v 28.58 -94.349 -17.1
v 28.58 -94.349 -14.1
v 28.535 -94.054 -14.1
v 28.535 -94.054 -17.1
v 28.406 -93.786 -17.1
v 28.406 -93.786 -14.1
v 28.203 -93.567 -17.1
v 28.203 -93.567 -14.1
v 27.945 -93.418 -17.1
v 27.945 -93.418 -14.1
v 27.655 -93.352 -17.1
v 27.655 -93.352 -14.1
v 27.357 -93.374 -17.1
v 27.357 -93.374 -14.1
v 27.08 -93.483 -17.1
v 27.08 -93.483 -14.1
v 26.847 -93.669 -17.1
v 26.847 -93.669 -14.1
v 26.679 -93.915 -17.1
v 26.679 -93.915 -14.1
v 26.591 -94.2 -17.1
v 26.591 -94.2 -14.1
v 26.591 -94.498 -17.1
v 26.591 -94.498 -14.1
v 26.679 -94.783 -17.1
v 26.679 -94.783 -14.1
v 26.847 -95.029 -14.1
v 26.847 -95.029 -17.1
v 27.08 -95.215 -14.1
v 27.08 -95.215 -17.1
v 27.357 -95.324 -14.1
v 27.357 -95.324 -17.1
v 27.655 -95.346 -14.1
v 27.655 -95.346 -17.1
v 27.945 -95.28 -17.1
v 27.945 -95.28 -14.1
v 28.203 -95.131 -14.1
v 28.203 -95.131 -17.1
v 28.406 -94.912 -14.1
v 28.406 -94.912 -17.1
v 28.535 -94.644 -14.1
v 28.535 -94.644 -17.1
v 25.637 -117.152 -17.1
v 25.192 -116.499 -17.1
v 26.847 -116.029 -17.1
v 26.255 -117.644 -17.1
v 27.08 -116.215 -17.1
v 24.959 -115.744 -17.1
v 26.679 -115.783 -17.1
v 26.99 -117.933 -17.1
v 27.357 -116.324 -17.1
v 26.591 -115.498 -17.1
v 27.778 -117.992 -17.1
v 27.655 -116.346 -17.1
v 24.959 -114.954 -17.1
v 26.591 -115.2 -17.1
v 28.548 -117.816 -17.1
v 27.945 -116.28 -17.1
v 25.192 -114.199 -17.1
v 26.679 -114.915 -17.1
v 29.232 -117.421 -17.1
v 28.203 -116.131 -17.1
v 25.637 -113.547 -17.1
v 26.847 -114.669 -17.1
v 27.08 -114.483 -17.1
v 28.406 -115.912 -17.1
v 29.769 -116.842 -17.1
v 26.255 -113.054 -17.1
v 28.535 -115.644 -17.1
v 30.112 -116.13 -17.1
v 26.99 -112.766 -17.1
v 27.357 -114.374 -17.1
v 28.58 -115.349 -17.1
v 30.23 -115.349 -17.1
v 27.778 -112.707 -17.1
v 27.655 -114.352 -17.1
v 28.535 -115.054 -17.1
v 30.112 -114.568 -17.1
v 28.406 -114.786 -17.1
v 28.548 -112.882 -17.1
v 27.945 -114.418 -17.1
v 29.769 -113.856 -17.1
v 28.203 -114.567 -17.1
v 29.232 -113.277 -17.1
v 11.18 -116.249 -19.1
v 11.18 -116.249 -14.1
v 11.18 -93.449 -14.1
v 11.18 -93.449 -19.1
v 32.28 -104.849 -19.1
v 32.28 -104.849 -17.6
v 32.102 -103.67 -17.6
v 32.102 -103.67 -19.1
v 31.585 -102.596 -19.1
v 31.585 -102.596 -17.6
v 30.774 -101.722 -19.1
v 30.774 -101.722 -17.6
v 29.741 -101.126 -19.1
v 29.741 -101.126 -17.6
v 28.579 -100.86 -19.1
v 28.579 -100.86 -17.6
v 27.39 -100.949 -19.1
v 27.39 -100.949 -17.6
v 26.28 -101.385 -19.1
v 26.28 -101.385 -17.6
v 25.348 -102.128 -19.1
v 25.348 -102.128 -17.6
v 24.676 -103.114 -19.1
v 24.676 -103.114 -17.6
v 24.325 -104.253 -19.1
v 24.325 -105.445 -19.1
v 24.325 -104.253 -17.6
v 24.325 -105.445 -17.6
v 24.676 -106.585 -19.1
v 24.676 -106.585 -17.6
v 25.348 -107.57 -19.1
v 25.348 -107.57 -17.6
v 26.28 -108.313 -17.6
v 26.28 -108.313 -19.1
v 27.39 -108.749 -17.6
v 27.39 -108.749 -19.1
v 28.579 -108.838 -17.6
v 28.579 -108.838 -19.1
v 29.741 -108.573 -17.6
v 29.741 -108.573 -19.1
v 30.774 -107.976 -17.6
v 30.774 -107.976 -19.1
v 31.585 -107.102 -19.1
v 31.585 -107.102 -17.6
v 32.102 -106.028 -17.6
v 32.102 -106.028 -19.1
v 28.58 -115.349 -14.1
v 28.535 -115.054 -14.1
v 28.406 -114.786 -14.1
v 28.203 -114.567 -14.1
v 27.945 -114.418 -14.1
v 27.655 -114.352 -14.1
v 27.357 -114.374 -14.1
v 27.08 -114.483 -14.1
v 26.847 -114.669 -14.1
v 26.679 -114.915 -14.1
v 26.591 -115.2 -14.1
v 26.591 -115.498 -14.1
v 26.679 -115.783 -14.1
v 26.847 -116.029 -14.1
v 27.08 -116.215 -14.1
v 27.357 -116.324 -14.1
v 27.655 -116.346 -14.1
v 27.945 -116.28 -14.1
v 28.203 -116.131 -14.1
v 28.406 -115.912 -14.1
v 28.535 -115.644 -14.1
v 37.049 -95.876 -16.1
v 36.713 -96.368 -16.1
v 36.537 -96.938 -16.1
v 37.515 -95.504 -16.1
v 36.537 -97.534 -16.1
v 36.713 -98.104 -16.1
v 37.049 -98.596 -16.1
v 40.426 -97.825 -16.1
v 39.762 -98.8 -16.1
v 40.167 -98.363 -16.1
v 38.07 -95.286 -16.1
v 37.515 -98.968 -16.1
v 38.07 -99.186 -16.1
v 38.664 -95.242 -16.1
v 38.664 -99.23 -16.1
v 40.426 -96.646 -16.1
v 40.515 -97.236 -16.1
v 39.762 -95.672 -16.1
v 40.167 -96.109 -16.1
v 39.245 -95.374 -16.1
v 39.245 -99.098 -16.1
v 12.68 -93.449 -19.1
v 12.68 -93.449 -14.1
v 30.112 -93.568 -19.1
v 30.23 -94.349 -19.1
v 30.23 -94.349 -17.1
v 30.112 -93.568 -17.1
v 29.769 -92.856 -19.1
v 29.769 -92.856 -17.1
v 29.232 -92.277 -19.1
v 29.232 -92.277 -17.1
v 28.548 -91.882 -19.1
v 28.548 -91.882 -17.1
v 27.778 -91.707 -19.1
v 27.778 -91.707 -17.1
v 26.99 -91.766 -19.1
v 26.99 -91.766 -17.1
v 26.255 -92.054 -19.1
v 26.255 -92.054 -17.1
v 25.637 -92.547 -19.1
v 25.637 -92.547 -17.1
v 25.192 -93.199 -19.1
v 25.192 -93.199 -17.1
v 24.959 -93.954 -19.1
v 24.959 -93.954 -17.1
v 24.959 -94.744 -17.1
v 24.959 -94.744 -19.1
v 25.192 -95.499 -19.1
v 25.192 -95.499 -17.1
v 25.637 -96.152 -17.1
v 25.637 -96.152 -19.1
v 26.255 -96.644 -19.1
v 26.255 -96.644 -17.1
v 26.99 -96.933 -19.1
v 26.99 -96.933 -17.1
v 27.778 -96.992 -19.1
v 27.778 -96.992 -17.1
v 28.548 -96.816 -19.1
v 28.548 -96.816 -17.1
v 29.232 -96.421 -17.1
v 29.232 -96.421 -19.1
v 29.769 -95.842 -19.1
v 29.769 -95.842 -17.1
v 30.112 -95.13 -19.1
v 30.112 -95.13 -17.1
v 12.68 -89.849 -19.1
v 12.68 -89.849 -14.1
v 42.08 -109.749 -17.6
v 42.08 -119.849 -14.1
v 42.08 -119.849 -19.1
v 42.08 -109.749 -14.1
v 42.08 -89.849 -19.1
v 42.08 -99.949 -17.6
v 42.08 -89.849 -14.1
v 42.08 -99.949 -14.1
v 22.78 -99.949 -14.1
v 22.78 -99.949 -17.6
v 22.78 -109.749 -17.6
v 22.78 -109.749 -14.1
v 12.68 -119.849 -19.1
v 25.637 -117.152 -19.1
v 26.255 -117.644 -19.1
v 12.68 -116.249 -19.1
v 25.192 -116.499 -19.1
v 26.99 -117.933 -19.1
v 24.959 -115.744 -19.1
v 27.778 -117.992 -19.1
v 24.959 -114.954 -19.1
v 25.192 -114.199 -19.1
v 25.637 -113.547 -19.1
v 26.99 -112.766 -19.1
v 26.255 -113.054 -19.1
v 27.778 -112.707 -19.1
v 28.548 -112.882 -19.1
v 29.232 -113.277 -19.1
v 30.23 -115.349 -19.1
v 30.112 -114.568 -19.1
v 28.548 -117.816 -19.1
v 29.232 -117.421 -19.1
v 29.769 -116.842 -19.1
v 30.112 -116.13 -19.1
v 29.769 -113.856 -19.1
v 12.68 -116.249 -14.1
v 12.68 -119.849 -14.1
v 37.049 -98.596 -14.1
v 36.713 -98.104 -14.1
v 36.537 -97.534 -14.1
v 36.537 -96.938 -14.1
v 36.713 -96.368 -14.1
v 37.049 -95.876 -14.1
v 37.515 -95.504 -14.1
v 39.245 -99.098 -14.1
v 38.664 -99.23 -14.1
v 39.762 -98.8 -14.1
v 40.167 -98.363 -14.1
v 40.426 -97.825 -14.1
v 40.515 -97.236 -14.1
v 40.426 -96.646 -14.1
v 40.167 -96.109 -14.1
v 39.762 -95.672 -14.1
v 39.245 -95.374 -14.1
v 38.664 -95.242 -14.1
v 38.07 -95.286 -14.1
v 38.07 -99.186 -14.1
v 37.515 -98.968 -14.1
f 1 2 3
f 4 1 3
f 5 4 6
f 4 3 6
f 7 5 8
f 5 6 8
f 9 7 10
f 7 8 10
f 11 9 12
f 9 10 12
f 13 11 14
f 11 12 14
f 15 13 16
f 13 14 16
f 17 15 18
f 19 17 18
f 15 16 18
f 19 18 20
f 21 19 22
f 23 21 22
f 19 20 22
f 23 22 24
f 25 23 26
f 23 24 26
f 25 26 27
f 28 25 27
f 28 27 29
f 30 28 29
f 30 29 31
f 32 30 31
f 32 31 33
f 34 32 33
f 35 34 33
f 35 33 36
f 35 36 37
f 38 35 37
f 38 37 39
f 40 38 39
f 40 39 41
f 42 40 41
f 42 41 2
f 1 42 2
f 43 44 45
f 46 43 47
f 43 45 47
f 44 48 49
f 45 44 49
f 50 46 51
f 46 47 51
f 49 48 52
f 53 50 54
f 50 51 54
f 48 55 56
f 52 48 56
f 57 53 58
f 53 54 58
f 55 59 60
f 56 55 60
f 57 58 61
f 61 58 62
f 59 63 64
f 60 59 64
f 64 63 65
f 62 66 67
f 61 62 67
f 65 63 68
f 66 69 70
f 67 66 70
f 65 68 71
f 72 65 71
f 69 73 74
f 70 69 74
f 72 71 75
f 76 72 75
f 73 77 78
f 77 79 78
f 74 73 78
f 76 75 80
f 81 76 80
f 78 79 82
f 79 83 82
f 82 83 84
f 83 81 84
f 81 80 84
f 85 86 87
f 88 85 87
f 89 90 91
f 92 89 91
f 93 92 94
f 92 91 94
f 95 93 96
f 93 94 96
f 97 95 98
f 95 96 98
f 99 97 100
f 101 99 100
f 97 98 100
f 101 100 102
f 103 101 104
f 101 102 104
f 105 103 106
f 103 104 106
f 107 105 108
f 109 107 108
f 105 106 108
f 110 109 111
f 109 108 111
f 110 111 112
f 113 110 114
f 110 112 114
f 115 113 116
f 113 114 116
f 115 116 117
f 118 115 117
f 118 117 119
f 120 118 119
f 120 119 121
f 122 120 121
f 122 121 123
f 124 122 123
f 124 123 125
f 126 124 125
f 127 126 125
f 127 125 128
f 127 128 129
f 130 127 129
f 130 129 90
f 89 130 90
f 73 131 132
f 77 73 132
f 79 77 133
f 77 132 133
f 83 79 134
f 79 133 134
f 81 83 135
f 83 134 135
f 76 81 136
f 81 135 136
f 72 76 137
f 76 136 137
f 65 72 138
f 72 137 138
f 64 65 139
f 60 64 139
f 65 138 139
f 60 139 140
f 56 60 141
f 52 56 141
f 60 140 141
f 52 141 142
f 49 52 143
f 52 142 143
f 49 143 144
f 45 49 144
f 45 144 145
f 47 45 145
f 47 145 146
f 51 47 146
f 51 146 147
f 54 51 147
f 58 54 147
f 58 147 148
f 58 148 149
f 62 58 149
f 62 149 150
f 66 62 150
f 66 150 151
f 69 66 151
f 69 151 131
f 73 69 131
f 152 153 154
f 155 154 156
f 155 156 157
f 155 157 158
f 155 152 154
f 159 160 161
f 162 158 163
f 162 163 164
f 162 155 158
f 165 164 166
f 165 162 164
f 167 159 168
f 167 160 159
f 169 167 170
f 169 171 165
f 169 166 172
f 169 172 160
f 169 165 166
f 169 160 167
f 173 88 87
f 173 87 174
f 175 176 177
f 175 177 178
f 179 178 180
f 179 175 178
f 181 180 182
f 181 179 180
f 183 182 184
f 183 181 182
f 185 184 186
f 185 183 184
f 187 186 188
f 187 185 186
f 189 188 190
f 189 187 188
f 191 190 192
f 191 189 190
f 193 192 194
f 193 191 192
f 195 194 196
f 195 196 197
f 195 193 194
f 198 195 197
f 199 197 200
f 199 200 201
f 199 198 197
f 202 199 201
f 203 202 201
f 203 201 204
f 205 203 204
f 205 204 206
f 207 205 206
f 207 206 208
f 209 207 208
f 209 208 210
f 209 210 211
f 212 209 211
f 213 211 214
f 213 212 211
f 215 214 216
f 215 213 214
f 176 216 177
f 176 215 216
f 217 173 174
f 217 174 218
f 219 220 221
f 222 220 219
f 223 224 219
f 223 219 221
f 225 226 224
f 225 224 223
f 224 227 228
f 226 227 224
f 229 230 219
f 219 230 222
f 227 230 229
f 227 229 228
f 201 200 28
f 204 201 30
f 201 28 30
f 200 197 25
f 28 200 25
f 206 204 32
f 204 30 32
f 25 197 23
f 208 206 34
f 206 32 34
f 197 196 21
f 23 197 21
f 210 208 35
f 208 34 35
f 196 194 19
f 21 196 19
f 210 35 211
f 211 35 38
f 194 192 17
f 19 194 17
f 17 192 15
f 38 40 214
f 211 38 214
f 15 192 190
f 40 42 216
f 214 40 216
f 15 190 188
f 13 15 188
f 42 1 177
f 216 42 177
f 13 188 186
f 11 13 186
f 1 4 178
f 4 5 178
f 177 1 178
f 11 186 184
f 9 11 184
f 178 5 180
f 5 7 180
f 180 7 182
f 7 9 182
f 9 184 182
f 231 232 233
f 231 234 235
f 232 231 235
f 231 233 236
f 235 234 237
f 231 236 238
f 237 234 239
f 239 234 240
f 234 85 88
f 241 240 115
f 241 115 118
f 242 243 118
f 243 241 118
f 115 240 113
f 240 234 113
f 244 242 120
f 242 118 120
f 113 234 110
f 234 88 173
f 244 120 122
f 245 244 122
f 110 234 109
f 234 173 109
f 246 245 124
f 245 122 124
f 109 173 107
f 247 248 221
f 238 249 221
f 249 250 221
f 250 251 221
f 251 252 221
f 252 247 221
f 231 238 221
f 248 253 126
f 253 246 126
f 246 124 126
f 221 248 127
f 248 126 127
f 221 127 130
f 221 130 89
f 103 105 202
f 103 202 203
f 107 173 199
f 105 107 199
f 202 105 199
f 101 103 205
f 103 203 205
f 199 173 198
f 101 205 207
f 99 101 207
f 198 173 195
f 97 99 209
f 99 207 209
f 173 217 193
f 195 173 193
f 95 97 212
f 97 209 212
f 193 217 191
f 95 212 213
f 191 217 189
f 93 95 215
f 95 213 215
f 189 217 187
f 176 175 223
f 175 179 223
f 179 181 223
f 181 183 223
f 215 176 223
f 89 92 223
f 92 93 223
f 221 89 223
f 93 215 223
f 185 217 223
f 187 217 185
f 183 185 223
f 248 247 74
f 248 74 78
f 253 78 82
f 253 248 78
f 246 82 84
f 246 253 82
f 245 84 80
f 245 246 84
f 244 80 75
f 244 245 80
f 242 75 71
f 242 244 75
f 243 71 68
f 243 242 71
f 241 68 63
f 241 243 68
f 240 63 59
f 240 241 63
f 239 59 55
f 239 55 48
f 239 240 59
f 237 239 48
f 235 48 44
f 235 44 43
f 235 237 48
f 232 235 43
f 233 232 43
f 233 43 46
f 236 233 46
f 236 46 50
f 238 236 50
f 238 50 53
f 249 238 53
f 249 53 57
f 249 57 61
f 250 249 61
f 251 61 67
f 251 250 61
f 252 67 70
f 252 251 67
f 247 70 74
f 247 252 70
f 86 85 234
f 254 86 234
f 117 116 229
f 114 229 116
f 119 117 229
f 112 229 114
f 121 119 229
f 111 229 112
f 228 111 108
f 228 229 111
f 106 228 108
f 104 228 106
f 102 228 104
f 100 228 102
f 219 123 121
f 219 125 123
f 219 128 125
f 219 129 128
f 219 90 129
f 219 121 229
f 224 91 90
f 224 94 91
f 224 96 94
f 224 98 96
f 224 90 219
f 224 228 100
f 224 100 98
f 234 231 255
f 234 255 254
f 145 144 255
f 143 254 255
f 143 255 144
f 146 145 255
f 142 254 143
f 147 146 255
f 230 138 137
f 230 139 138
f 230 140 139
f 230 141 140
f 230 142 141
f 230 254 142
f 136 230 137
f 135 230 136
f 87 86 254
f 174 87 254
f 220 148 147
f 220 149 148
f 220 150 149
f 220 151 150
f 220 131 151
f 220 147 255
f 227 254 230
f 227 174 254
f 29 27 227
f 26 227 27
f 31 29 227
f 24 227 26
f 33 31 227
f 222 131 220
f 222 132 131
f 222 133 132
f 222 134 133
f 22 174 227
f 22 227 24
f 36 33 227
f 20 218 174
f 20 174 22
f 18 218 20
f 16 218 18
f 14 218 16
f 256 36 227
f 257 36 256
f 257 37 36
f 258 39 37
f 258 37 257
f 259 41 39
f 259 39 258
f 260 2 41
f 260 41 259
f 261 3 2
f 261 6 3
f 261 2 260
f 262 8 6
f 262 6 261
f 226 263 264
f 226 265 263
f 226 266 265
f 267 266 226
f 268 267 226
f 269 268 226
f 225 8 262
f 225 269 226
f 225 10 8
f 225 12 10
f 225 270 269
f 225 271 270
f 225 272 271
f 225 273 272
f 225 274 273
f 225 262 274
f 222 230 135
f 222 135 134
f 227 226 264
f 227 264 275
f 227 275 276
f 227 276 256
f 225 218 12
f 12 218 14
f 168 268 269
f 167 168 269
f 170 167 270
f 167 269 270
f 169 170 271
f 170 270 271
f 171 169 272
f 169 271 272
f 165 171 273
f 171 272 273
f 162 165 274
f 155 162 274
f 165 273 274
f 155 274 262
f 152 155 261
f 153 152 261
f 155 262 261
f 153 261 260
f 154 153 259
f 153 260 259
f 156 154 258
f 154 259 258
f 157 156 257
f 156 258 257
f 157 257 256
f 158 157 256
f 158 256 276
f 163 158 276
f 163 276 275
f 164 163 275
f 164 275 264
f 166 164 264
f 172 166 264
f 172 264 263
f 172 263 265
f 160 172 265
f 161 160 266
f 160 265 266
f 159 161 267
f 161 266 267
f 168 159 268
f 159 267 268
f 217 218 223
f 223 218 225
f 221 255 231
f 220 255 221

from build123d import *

# Parameters (mm, degrees)
CIRCLE034_R      = 2
EXTRUDE206_DEPTH = 2
CIRCLE_R         = 1
EXTRUDE086_DEPTH = 5
CIRCLE025_R      = 1
EXTRUDE088_DEPTH = 5
CIRCLE022_R      = 4
EXTRUDE160_DEPTH = 5
CIRCLE030_R      = 2.65
EXTRUDE173_DEPTH = 2
CIRCLE031_R      = 2.65
EXTRUDE174_DEPTH = 2
RECTANGLE045_W   = 19.3
RECTANGLE045_H   = 9.8
EXTRUDE085_DEPTH = 3.5
RECTANGLE043_W   = 29.4
RECTANGLE043_H   = 30
EXTRUDE083_DEPTH = 5
RECTANGLE044_W   = 1.5
RECTANGLE044_H   = 22.8
EXTRUDE095_DEPTH = 5


with BuildPart() as extrude206:
    # Circle034 → Extrude206 (new body)
    with BuildSketch(Plane(origin=(38.514674, -97.235972, -14.1), x_dir=(1, 0, 0), z_dir=(0, 0, 1))):
        Circle(CIRCLE034_R)
    extrude(amount=-EXTRUDE206_DEPTH)


with BuildPart() as extrude086:
    # Circle → Extrude086 (new body)
    with BuildSketch(Plane(origin=(27.579856, -94.349147, -14.1), x_dir=(1, 0, 0), z_dir=(0, 0, 1))):
        Circle(CIRCLE_R)
    extrude(amount=-EXTRUDE086_DEPTH)


with BuildPart() as extrude088:
    # Circle025 → Extrude088 (new body)
    with BuildSketch(Plane(origin=(27.579856, -115.349147, -14.1), x_dir=(1, 0, 0), z_dir=(0, 0, 1))):
        Circle(CIRCLE025_R)
    extrude(amount=-EXTRUDE088_DEPTH)


with BuildPart() as extrude160:
    # Circle022 → Extrude160 (new body)
    with BuildSketch(Plane(origin=(28.279856, -104.849147, -14.1), x_dir=(1, 0, 0), z_dir=(0, 0, 1))):
        Circle(CIRCLE022_R)
    extrude(amount=-EXTRUDE160_DEPTH)


with BuildPart() as extrude173:
    # Circle030 → Extrude173 (new body)
    with BuildSketch(Plane(origin=(27.579856, -94.349147, -19.1), x_dir=(1, 0, 0), z_dir=(0, 0, 1))):
        Circle(CIRCLE030_R)
    extrude(amount=EXTRUDE173_DEPTH)


with BuildPart() as extrude174:
    # Circle031 → Extrude174 (new body)
    with BuildSketch(Plane(origin=(27.579856, -115.349147, -19.1), x_dir=(1, 0, 0), z_dir=(0, 0, 1))):
        Circle(CIRCLE031_R)
    extrude(amount=EXTRUDE174_DEPTH)


with BuildPart() as extrude085:
    # Rectangle045 → Extrude085 (new body)
    with BuildSketch(Plane(origin=(22.779856, -109.749147, -14.1), x_dir=(1, 0, 0), z_dir=(0, 0, 1))):
        with Locations((9.65, 4.9)):
            Rectangle(RECTANGLE045_W, RECTANGLE045_H)
    extrude(amount=-EXTRUDE085_DEPTH)


with BuildPart() as cut107:
    # Rectangle043 → Extrude083 (new body)
    with BuildSketch(Plane(origin=(12.679856, -119.849147, -14.1), x_dir=(1, 0, 0), z_dir=(0, 0, 1))):
        with Locations((14.7, 15)):
            Rectangle(RECTANGLE043_W, RECTANGLE043_H)
    extrude(amount=-EXTRUDE083_DEPTH)

    # Cut027: cut Extrude085
    add(extrude085.part, mode=Mode.SUBTRACT)

    # Cut086: cut Extrude174
    add(extrude174.part, mode=Mode.SUBTRACT)

    # Cut087: cut Extrude173
    add(extrude173.part, mode=Mode.SUBTRACT)

    # Cut088: cut Extrude160
    add(extrude160.part, mode=Mode.SUBTRACT)

    # Cut089: cut Extrude088
    add(extrude088.part, mode=Mode.SUBTRACT)

    # Cut090: cut Extrude086
    add(extrude086.part, mode=Mode.SUBTRACT)

    # Cut107: cut Extrude206
    add(extrude206.part, mode=Mode.SUBTRACT)


with BuildPart() as fusion_lens_cover:
    # Rectangle044 → Extrude095 (new body)
    with BuildSketch(Plane(origin=(11.179856, -116.249147, -14.1), x_dir=(1, 0, 0), z_dir=(0, 0, 1))):
        with Locations((0.75, 11.4)):
            Rectangle(RECTANGLE044_W, RECTANGLE044_H)
    extrude(amount=-EXTRUDE095_DEPTH)

    # Fusion047: union Cut107
    add(cut107.part)


solid = fusion_lens_cover.part
